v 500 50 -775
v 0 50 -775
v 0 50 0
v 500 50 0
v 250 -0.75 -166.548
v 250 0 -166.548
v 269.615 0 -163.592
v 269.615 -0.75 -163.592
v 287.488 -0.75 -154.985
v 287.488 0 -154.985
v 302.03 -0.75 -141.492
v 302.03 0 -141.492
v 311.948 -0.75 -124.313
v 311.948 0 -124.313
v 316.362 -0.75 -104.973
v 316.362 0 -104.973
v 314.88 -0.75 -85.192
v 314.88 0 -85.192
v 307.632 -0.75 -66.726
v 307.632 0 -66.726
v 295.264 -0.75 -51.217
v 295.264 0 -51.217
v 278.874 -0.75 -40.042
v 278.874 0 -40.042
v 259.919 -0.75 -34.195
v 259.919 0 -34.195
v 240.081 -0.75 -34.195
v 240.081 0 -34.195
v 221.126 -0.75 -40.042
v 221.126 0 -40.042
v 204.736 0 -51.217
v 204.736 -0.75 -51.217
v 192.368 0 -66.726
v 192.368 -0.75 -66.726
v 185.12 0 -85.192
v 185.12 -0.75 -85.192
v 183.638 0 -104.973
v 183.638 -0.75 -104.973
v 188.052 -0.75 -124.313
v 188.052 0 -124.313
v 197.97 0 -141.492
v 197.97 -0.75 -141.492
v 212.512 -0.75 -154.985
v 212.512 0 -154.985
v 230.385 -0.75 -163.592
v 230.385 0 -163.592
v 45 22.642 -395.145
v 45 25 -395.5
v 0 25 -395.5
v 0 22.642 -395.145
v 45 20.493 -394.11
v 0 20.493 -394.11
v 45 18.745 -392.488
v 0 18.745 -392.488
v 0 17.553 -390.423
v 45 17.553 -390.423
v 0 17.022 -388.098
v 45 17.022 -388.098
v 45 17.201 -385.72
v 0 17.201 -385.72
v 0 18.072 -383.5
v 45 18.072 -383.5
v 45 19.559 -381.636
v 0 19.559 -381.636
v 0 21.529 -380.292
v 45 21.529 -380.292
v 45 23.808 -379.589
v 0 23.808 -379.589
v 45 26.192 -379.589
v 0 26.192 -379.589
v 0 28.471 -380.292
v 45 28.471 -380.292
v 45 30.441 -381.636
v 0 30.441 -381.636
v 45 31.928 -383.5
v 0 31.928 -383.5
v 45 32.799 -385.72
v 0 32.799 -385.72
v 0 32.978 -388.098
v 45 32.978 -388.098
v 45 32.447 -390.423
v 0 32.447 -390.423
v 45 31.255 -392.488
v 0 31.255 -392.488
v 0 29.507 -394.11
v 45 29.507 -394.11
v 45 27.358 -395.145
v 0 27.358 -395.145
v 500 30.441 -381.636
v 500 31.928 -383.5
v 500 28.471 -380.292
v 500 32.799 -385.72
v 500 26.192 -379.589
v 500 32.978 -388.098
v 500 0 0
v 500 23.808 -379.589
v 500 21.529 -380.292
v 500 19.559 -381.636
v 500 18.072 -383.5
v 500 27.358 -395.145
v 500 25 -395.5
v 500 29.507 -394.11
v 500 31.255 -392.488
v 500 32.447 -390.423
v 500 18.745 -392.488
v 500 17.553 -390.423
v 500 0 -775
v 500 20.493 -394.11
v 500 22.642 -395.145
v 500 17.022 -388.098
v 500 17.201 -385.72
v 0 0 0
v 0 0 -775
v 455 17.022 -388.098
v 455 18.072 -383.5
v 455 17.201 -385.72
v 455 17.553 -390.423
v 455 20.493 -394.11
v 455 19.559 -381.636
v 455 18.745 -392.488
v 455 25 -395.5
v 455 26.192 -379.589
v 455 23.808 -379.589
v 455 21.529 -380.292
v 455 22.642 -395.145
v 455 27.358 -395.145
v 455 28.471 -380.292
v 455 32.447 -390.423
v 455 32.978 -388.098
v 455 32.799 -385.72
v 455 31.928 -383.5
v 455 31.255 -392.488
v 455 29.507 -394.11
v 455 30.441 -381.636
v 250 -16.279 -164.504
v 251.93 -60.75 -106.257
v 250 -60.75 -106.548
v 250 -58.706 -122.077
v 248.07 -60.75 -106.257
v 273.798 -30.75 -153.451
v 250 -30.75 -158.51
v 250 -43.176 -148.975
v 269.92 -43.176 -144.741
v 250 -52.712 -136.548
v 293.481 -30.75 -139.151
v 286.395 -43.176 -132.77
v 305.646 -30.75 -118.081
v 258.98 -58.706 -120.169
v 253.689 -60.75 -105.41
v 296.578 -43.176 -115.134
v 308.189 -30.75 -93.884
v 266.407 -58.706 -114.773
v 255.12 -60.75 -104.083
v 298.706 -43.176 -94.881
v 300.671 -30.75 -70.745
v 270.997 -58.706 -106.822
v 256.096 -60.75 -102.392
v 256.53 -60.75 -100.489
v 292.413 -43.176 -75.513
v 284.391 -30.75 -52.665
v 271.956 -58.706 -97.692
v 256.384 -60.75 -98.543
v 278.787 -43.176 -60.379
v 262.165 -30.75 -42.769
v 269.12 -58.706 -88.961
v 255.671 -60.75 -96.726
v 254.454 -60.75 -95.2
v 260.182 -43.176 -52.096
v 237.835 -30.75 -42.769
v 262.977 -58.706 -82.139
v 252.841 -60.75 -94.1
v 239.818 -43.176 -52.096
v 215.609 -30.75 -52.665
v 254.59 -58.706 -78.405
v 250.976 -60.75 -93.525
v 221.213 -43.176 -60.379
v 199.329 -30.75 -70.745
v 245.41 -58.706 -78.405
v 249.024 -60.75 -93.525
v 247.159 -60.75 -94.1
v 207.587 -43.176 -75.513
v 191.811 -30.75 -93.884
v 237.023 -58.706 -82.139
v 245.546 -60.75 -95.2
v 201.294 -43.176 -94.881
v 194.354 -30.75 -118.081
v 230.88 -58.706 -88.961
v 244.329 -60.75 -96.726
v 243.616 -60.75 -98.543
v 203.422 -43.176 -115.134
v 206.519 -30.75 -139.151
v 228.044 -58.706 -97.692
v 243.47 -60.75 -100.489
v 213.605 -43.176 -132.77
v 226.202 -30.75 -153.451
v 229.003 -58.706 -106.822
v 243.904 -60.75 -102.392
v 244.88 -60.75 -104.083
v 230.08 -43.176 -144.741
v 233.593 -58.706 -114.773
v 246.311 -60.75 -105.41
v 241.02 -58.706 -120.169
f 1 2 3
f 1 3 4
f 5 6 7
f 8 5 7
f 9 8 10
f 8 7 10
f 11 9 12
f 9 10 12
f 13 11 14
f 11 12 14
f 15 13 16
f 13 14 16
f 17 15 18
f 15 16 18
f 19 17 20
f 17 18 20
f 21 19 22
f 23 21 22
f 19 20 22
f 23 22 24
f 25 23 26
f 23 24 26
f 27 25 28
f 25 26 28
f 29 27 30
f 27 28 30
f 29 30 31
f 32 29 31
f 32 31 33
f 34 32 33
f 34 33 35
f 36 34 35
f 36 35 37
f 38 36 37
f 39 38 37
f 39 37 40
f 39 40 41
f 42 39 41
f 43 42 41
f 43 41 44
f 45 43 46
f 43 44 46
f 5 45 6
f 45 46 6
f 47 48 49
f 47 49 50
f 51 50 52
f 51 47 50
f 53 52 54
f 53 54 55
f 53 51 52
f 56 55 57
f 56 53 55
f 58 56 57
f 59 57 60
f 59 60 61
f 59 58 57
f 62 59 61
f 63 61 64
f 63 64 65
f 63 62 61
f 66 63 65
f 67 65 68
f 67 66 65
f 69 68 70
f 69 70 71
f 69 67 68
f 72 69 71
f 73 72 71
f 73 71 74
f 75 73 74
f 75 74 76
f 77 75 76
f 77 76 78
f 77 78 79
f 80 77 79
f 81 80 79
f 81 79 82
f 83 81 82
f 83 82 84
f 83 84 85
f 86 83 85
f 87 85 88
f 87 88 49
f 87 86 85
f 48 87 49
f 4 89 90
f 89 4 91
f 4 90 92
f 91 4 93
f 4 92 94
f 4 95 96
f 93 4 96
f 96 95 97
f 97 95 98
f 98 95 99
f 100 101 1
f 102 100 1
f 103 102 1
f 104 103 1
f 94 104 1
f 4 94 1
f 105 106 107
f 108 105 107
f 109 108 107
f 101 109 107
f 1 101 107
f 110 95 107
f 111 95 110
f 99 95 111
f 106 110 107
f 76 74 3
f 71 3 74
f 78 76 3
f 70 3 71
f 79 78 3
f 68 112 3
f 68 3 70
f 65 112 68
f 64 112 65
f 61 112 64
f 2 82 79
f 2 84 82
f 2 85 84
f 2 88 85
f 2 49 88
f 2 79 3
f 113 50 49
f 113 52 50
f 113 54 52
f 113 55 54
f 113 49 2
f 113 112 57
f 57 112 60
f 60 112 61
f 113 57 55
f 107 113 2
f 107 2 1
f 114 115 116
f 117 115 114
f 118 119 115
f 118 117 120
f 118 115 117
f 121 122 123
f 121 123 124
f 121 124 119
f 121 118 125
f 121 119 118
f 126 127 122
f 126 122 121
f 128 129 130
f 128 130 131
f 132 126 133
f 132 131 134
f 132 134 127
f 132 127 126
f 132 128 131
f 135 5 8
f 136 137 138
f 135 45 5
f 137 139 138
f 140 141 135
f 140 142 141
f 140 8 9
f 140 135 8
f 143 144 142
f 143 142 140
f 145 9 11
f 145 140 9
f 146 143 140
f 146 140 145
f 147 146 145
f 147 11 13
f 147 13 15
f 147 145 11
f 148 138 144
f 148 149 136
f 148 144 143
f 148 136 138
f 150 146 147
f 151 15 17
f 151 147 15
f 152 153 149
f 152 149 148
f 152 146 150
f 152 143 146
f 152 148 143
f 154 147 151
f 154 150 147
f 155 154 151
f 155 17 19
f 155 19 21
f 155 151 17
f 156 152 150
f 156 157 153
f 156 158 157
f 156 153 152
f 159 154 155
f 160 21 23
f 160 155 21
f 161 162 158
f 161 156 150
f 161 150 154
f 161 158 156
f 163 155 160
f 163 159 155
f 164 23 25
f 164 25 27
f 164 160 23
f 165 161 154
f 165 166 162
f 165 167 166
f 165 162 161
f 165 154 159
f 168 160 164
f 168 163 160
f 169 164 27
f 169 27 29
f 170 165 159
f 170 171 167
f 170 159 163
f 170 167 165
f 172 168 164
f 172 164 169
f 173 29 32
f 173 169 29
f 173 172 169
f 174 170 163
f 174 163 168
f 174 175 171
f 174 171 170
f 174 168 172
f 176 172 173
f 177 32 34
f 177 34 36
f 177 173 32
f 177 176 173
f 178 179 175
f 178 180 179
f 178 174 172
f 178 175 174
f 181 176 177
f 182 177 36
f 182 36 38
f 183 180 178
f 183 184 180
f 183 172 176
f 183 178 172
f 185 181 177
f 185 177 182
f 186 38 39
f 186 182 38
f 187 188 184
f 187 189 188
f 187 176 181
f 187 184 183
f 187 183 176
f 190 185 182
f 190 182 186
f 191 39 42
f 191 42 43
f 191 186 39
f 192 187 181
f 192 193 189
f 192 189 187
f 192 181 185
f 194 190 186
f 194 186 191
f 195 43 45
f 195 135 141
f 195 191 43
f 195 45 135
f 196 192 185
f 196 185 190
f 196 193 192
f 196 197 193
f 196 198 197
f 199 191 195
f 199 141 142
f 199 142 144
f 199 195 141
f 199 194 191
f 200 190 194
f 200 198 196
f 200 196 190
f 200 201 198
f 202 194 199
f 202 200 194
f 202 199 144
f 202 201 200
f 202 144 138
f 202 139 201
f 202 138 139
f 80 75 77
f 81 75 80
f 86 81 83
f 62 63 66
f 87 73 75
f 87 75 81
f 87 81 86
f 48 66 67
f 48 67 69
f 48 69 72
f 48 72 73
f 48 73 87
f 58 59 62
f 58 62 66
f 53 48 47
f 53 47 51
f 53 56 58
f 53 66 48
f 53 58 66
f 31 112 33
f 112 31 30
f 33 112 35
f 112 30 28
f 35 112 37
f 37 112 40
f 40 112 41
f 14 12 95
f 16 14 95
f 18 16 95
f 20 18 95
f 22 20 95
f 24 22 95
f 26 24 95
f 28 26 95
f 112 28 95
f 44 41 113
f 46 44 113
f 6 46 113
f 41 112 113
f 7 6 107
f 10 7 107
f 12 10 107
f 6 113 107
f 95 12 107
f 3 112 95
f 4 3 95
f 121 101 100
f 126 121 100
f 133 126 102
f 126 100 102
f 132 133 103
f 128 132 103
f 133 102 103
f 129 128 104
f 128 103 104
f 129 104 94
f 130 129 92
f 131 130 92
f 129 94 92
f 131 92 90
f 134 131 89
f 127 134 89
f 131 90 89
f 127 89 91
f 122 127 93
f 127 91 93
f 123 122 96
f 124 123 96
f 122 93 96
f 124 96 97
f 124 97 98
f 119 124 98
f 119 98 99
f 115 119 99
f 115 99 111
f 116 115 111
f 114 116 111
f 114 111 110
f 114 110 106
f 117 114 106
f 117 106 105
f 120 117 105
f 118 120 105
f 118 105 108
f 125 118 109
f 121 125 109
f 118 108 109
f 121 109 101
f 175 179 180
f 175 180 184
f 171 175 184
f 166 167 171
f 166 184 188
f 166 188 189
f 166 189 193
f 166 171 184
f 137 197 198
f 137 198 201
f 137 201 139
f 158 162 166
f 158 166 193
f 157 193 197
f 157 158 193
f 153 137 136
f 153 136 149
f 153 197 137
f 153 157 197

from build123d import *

# Parameters (mm, degrees)
SKETCH1_W           = 500
SKETCH1_H           = 775
BOSS_EXTRUDE1_DEPTH = 50
SKETCH2_R           = 8
CUT_EXTRUDE1_DEPTH  = 45
CUT_EXTRUDE2_START  = -45
SKETCH3_R           = 8
CUT_EXTRUDE2_DEPTH  = 45
SKETCH4_R           = 66.548277476
BOSS_EXTRUDE2_DEPTH = 60.75
FILLET1_R           = 60


with BuildPart() as part:
    # Sketch1 → Boss-Extrude1 (new body)
    with BuildSketch(Plane(origin=(0, 0, 0), x_dir=(1, 0, 0), z_dir=(0, 1, 0))):
        with Locations((250, 387.5)):
            Rectangle(SKETCH1_W, SKETCH1_H)
    extrude(amount=BOSS_EXTRUDE1_DEPTH)

    # Sketch2 → Cut-Extrude1 (cut)
    with BuildSketch(Plane(origin=(500, 0, 0), x_dir=(0, 0, -1), z_dir=(1, 0, 0))):
        with Locations((387.5, 25)):
            Circle(SKETCH2_R)
    extrude(amount=-CUT_EXTRUDE1_DEPTH, mode=Mode.SUBTRACT)

    # Sketch3 → Cut-Extrude2 (cut)
    with BuildSketch(Plane.ZY.offset(CUT_EXTRUDE2_START)):
        with Locations(Location((-387.5, 25, 0), (0, 0, 180))):
            Circle(SKETCH3_R)
    extrude(amount=CUT_EXTRUDE2_DEPTH, mode=Mode.SUBTRACT)

    # Sketch4 → Boss-Extrude2 (add)
    with BuildSketch(Plane(origin=(0, 0, 0), x_dir=(-1, 0, 0), z_dir=(0, -1, 0))):
        with Locations(Location((-250, 100, 0), (0, 0, 90))):
            Circle(SKETCH4_R)
    extrude(amount=BOSS_EXTRUDE2_DEPTH)

    # Fillet1
    fillet1_edges = [part.edges().sort_by_distance(p)[0] for p in [
        (250, -60.75, -33.451722524),
    ]]
    fillet(fillet1_edges, radius=FILLET1_R)


solid = part.part
